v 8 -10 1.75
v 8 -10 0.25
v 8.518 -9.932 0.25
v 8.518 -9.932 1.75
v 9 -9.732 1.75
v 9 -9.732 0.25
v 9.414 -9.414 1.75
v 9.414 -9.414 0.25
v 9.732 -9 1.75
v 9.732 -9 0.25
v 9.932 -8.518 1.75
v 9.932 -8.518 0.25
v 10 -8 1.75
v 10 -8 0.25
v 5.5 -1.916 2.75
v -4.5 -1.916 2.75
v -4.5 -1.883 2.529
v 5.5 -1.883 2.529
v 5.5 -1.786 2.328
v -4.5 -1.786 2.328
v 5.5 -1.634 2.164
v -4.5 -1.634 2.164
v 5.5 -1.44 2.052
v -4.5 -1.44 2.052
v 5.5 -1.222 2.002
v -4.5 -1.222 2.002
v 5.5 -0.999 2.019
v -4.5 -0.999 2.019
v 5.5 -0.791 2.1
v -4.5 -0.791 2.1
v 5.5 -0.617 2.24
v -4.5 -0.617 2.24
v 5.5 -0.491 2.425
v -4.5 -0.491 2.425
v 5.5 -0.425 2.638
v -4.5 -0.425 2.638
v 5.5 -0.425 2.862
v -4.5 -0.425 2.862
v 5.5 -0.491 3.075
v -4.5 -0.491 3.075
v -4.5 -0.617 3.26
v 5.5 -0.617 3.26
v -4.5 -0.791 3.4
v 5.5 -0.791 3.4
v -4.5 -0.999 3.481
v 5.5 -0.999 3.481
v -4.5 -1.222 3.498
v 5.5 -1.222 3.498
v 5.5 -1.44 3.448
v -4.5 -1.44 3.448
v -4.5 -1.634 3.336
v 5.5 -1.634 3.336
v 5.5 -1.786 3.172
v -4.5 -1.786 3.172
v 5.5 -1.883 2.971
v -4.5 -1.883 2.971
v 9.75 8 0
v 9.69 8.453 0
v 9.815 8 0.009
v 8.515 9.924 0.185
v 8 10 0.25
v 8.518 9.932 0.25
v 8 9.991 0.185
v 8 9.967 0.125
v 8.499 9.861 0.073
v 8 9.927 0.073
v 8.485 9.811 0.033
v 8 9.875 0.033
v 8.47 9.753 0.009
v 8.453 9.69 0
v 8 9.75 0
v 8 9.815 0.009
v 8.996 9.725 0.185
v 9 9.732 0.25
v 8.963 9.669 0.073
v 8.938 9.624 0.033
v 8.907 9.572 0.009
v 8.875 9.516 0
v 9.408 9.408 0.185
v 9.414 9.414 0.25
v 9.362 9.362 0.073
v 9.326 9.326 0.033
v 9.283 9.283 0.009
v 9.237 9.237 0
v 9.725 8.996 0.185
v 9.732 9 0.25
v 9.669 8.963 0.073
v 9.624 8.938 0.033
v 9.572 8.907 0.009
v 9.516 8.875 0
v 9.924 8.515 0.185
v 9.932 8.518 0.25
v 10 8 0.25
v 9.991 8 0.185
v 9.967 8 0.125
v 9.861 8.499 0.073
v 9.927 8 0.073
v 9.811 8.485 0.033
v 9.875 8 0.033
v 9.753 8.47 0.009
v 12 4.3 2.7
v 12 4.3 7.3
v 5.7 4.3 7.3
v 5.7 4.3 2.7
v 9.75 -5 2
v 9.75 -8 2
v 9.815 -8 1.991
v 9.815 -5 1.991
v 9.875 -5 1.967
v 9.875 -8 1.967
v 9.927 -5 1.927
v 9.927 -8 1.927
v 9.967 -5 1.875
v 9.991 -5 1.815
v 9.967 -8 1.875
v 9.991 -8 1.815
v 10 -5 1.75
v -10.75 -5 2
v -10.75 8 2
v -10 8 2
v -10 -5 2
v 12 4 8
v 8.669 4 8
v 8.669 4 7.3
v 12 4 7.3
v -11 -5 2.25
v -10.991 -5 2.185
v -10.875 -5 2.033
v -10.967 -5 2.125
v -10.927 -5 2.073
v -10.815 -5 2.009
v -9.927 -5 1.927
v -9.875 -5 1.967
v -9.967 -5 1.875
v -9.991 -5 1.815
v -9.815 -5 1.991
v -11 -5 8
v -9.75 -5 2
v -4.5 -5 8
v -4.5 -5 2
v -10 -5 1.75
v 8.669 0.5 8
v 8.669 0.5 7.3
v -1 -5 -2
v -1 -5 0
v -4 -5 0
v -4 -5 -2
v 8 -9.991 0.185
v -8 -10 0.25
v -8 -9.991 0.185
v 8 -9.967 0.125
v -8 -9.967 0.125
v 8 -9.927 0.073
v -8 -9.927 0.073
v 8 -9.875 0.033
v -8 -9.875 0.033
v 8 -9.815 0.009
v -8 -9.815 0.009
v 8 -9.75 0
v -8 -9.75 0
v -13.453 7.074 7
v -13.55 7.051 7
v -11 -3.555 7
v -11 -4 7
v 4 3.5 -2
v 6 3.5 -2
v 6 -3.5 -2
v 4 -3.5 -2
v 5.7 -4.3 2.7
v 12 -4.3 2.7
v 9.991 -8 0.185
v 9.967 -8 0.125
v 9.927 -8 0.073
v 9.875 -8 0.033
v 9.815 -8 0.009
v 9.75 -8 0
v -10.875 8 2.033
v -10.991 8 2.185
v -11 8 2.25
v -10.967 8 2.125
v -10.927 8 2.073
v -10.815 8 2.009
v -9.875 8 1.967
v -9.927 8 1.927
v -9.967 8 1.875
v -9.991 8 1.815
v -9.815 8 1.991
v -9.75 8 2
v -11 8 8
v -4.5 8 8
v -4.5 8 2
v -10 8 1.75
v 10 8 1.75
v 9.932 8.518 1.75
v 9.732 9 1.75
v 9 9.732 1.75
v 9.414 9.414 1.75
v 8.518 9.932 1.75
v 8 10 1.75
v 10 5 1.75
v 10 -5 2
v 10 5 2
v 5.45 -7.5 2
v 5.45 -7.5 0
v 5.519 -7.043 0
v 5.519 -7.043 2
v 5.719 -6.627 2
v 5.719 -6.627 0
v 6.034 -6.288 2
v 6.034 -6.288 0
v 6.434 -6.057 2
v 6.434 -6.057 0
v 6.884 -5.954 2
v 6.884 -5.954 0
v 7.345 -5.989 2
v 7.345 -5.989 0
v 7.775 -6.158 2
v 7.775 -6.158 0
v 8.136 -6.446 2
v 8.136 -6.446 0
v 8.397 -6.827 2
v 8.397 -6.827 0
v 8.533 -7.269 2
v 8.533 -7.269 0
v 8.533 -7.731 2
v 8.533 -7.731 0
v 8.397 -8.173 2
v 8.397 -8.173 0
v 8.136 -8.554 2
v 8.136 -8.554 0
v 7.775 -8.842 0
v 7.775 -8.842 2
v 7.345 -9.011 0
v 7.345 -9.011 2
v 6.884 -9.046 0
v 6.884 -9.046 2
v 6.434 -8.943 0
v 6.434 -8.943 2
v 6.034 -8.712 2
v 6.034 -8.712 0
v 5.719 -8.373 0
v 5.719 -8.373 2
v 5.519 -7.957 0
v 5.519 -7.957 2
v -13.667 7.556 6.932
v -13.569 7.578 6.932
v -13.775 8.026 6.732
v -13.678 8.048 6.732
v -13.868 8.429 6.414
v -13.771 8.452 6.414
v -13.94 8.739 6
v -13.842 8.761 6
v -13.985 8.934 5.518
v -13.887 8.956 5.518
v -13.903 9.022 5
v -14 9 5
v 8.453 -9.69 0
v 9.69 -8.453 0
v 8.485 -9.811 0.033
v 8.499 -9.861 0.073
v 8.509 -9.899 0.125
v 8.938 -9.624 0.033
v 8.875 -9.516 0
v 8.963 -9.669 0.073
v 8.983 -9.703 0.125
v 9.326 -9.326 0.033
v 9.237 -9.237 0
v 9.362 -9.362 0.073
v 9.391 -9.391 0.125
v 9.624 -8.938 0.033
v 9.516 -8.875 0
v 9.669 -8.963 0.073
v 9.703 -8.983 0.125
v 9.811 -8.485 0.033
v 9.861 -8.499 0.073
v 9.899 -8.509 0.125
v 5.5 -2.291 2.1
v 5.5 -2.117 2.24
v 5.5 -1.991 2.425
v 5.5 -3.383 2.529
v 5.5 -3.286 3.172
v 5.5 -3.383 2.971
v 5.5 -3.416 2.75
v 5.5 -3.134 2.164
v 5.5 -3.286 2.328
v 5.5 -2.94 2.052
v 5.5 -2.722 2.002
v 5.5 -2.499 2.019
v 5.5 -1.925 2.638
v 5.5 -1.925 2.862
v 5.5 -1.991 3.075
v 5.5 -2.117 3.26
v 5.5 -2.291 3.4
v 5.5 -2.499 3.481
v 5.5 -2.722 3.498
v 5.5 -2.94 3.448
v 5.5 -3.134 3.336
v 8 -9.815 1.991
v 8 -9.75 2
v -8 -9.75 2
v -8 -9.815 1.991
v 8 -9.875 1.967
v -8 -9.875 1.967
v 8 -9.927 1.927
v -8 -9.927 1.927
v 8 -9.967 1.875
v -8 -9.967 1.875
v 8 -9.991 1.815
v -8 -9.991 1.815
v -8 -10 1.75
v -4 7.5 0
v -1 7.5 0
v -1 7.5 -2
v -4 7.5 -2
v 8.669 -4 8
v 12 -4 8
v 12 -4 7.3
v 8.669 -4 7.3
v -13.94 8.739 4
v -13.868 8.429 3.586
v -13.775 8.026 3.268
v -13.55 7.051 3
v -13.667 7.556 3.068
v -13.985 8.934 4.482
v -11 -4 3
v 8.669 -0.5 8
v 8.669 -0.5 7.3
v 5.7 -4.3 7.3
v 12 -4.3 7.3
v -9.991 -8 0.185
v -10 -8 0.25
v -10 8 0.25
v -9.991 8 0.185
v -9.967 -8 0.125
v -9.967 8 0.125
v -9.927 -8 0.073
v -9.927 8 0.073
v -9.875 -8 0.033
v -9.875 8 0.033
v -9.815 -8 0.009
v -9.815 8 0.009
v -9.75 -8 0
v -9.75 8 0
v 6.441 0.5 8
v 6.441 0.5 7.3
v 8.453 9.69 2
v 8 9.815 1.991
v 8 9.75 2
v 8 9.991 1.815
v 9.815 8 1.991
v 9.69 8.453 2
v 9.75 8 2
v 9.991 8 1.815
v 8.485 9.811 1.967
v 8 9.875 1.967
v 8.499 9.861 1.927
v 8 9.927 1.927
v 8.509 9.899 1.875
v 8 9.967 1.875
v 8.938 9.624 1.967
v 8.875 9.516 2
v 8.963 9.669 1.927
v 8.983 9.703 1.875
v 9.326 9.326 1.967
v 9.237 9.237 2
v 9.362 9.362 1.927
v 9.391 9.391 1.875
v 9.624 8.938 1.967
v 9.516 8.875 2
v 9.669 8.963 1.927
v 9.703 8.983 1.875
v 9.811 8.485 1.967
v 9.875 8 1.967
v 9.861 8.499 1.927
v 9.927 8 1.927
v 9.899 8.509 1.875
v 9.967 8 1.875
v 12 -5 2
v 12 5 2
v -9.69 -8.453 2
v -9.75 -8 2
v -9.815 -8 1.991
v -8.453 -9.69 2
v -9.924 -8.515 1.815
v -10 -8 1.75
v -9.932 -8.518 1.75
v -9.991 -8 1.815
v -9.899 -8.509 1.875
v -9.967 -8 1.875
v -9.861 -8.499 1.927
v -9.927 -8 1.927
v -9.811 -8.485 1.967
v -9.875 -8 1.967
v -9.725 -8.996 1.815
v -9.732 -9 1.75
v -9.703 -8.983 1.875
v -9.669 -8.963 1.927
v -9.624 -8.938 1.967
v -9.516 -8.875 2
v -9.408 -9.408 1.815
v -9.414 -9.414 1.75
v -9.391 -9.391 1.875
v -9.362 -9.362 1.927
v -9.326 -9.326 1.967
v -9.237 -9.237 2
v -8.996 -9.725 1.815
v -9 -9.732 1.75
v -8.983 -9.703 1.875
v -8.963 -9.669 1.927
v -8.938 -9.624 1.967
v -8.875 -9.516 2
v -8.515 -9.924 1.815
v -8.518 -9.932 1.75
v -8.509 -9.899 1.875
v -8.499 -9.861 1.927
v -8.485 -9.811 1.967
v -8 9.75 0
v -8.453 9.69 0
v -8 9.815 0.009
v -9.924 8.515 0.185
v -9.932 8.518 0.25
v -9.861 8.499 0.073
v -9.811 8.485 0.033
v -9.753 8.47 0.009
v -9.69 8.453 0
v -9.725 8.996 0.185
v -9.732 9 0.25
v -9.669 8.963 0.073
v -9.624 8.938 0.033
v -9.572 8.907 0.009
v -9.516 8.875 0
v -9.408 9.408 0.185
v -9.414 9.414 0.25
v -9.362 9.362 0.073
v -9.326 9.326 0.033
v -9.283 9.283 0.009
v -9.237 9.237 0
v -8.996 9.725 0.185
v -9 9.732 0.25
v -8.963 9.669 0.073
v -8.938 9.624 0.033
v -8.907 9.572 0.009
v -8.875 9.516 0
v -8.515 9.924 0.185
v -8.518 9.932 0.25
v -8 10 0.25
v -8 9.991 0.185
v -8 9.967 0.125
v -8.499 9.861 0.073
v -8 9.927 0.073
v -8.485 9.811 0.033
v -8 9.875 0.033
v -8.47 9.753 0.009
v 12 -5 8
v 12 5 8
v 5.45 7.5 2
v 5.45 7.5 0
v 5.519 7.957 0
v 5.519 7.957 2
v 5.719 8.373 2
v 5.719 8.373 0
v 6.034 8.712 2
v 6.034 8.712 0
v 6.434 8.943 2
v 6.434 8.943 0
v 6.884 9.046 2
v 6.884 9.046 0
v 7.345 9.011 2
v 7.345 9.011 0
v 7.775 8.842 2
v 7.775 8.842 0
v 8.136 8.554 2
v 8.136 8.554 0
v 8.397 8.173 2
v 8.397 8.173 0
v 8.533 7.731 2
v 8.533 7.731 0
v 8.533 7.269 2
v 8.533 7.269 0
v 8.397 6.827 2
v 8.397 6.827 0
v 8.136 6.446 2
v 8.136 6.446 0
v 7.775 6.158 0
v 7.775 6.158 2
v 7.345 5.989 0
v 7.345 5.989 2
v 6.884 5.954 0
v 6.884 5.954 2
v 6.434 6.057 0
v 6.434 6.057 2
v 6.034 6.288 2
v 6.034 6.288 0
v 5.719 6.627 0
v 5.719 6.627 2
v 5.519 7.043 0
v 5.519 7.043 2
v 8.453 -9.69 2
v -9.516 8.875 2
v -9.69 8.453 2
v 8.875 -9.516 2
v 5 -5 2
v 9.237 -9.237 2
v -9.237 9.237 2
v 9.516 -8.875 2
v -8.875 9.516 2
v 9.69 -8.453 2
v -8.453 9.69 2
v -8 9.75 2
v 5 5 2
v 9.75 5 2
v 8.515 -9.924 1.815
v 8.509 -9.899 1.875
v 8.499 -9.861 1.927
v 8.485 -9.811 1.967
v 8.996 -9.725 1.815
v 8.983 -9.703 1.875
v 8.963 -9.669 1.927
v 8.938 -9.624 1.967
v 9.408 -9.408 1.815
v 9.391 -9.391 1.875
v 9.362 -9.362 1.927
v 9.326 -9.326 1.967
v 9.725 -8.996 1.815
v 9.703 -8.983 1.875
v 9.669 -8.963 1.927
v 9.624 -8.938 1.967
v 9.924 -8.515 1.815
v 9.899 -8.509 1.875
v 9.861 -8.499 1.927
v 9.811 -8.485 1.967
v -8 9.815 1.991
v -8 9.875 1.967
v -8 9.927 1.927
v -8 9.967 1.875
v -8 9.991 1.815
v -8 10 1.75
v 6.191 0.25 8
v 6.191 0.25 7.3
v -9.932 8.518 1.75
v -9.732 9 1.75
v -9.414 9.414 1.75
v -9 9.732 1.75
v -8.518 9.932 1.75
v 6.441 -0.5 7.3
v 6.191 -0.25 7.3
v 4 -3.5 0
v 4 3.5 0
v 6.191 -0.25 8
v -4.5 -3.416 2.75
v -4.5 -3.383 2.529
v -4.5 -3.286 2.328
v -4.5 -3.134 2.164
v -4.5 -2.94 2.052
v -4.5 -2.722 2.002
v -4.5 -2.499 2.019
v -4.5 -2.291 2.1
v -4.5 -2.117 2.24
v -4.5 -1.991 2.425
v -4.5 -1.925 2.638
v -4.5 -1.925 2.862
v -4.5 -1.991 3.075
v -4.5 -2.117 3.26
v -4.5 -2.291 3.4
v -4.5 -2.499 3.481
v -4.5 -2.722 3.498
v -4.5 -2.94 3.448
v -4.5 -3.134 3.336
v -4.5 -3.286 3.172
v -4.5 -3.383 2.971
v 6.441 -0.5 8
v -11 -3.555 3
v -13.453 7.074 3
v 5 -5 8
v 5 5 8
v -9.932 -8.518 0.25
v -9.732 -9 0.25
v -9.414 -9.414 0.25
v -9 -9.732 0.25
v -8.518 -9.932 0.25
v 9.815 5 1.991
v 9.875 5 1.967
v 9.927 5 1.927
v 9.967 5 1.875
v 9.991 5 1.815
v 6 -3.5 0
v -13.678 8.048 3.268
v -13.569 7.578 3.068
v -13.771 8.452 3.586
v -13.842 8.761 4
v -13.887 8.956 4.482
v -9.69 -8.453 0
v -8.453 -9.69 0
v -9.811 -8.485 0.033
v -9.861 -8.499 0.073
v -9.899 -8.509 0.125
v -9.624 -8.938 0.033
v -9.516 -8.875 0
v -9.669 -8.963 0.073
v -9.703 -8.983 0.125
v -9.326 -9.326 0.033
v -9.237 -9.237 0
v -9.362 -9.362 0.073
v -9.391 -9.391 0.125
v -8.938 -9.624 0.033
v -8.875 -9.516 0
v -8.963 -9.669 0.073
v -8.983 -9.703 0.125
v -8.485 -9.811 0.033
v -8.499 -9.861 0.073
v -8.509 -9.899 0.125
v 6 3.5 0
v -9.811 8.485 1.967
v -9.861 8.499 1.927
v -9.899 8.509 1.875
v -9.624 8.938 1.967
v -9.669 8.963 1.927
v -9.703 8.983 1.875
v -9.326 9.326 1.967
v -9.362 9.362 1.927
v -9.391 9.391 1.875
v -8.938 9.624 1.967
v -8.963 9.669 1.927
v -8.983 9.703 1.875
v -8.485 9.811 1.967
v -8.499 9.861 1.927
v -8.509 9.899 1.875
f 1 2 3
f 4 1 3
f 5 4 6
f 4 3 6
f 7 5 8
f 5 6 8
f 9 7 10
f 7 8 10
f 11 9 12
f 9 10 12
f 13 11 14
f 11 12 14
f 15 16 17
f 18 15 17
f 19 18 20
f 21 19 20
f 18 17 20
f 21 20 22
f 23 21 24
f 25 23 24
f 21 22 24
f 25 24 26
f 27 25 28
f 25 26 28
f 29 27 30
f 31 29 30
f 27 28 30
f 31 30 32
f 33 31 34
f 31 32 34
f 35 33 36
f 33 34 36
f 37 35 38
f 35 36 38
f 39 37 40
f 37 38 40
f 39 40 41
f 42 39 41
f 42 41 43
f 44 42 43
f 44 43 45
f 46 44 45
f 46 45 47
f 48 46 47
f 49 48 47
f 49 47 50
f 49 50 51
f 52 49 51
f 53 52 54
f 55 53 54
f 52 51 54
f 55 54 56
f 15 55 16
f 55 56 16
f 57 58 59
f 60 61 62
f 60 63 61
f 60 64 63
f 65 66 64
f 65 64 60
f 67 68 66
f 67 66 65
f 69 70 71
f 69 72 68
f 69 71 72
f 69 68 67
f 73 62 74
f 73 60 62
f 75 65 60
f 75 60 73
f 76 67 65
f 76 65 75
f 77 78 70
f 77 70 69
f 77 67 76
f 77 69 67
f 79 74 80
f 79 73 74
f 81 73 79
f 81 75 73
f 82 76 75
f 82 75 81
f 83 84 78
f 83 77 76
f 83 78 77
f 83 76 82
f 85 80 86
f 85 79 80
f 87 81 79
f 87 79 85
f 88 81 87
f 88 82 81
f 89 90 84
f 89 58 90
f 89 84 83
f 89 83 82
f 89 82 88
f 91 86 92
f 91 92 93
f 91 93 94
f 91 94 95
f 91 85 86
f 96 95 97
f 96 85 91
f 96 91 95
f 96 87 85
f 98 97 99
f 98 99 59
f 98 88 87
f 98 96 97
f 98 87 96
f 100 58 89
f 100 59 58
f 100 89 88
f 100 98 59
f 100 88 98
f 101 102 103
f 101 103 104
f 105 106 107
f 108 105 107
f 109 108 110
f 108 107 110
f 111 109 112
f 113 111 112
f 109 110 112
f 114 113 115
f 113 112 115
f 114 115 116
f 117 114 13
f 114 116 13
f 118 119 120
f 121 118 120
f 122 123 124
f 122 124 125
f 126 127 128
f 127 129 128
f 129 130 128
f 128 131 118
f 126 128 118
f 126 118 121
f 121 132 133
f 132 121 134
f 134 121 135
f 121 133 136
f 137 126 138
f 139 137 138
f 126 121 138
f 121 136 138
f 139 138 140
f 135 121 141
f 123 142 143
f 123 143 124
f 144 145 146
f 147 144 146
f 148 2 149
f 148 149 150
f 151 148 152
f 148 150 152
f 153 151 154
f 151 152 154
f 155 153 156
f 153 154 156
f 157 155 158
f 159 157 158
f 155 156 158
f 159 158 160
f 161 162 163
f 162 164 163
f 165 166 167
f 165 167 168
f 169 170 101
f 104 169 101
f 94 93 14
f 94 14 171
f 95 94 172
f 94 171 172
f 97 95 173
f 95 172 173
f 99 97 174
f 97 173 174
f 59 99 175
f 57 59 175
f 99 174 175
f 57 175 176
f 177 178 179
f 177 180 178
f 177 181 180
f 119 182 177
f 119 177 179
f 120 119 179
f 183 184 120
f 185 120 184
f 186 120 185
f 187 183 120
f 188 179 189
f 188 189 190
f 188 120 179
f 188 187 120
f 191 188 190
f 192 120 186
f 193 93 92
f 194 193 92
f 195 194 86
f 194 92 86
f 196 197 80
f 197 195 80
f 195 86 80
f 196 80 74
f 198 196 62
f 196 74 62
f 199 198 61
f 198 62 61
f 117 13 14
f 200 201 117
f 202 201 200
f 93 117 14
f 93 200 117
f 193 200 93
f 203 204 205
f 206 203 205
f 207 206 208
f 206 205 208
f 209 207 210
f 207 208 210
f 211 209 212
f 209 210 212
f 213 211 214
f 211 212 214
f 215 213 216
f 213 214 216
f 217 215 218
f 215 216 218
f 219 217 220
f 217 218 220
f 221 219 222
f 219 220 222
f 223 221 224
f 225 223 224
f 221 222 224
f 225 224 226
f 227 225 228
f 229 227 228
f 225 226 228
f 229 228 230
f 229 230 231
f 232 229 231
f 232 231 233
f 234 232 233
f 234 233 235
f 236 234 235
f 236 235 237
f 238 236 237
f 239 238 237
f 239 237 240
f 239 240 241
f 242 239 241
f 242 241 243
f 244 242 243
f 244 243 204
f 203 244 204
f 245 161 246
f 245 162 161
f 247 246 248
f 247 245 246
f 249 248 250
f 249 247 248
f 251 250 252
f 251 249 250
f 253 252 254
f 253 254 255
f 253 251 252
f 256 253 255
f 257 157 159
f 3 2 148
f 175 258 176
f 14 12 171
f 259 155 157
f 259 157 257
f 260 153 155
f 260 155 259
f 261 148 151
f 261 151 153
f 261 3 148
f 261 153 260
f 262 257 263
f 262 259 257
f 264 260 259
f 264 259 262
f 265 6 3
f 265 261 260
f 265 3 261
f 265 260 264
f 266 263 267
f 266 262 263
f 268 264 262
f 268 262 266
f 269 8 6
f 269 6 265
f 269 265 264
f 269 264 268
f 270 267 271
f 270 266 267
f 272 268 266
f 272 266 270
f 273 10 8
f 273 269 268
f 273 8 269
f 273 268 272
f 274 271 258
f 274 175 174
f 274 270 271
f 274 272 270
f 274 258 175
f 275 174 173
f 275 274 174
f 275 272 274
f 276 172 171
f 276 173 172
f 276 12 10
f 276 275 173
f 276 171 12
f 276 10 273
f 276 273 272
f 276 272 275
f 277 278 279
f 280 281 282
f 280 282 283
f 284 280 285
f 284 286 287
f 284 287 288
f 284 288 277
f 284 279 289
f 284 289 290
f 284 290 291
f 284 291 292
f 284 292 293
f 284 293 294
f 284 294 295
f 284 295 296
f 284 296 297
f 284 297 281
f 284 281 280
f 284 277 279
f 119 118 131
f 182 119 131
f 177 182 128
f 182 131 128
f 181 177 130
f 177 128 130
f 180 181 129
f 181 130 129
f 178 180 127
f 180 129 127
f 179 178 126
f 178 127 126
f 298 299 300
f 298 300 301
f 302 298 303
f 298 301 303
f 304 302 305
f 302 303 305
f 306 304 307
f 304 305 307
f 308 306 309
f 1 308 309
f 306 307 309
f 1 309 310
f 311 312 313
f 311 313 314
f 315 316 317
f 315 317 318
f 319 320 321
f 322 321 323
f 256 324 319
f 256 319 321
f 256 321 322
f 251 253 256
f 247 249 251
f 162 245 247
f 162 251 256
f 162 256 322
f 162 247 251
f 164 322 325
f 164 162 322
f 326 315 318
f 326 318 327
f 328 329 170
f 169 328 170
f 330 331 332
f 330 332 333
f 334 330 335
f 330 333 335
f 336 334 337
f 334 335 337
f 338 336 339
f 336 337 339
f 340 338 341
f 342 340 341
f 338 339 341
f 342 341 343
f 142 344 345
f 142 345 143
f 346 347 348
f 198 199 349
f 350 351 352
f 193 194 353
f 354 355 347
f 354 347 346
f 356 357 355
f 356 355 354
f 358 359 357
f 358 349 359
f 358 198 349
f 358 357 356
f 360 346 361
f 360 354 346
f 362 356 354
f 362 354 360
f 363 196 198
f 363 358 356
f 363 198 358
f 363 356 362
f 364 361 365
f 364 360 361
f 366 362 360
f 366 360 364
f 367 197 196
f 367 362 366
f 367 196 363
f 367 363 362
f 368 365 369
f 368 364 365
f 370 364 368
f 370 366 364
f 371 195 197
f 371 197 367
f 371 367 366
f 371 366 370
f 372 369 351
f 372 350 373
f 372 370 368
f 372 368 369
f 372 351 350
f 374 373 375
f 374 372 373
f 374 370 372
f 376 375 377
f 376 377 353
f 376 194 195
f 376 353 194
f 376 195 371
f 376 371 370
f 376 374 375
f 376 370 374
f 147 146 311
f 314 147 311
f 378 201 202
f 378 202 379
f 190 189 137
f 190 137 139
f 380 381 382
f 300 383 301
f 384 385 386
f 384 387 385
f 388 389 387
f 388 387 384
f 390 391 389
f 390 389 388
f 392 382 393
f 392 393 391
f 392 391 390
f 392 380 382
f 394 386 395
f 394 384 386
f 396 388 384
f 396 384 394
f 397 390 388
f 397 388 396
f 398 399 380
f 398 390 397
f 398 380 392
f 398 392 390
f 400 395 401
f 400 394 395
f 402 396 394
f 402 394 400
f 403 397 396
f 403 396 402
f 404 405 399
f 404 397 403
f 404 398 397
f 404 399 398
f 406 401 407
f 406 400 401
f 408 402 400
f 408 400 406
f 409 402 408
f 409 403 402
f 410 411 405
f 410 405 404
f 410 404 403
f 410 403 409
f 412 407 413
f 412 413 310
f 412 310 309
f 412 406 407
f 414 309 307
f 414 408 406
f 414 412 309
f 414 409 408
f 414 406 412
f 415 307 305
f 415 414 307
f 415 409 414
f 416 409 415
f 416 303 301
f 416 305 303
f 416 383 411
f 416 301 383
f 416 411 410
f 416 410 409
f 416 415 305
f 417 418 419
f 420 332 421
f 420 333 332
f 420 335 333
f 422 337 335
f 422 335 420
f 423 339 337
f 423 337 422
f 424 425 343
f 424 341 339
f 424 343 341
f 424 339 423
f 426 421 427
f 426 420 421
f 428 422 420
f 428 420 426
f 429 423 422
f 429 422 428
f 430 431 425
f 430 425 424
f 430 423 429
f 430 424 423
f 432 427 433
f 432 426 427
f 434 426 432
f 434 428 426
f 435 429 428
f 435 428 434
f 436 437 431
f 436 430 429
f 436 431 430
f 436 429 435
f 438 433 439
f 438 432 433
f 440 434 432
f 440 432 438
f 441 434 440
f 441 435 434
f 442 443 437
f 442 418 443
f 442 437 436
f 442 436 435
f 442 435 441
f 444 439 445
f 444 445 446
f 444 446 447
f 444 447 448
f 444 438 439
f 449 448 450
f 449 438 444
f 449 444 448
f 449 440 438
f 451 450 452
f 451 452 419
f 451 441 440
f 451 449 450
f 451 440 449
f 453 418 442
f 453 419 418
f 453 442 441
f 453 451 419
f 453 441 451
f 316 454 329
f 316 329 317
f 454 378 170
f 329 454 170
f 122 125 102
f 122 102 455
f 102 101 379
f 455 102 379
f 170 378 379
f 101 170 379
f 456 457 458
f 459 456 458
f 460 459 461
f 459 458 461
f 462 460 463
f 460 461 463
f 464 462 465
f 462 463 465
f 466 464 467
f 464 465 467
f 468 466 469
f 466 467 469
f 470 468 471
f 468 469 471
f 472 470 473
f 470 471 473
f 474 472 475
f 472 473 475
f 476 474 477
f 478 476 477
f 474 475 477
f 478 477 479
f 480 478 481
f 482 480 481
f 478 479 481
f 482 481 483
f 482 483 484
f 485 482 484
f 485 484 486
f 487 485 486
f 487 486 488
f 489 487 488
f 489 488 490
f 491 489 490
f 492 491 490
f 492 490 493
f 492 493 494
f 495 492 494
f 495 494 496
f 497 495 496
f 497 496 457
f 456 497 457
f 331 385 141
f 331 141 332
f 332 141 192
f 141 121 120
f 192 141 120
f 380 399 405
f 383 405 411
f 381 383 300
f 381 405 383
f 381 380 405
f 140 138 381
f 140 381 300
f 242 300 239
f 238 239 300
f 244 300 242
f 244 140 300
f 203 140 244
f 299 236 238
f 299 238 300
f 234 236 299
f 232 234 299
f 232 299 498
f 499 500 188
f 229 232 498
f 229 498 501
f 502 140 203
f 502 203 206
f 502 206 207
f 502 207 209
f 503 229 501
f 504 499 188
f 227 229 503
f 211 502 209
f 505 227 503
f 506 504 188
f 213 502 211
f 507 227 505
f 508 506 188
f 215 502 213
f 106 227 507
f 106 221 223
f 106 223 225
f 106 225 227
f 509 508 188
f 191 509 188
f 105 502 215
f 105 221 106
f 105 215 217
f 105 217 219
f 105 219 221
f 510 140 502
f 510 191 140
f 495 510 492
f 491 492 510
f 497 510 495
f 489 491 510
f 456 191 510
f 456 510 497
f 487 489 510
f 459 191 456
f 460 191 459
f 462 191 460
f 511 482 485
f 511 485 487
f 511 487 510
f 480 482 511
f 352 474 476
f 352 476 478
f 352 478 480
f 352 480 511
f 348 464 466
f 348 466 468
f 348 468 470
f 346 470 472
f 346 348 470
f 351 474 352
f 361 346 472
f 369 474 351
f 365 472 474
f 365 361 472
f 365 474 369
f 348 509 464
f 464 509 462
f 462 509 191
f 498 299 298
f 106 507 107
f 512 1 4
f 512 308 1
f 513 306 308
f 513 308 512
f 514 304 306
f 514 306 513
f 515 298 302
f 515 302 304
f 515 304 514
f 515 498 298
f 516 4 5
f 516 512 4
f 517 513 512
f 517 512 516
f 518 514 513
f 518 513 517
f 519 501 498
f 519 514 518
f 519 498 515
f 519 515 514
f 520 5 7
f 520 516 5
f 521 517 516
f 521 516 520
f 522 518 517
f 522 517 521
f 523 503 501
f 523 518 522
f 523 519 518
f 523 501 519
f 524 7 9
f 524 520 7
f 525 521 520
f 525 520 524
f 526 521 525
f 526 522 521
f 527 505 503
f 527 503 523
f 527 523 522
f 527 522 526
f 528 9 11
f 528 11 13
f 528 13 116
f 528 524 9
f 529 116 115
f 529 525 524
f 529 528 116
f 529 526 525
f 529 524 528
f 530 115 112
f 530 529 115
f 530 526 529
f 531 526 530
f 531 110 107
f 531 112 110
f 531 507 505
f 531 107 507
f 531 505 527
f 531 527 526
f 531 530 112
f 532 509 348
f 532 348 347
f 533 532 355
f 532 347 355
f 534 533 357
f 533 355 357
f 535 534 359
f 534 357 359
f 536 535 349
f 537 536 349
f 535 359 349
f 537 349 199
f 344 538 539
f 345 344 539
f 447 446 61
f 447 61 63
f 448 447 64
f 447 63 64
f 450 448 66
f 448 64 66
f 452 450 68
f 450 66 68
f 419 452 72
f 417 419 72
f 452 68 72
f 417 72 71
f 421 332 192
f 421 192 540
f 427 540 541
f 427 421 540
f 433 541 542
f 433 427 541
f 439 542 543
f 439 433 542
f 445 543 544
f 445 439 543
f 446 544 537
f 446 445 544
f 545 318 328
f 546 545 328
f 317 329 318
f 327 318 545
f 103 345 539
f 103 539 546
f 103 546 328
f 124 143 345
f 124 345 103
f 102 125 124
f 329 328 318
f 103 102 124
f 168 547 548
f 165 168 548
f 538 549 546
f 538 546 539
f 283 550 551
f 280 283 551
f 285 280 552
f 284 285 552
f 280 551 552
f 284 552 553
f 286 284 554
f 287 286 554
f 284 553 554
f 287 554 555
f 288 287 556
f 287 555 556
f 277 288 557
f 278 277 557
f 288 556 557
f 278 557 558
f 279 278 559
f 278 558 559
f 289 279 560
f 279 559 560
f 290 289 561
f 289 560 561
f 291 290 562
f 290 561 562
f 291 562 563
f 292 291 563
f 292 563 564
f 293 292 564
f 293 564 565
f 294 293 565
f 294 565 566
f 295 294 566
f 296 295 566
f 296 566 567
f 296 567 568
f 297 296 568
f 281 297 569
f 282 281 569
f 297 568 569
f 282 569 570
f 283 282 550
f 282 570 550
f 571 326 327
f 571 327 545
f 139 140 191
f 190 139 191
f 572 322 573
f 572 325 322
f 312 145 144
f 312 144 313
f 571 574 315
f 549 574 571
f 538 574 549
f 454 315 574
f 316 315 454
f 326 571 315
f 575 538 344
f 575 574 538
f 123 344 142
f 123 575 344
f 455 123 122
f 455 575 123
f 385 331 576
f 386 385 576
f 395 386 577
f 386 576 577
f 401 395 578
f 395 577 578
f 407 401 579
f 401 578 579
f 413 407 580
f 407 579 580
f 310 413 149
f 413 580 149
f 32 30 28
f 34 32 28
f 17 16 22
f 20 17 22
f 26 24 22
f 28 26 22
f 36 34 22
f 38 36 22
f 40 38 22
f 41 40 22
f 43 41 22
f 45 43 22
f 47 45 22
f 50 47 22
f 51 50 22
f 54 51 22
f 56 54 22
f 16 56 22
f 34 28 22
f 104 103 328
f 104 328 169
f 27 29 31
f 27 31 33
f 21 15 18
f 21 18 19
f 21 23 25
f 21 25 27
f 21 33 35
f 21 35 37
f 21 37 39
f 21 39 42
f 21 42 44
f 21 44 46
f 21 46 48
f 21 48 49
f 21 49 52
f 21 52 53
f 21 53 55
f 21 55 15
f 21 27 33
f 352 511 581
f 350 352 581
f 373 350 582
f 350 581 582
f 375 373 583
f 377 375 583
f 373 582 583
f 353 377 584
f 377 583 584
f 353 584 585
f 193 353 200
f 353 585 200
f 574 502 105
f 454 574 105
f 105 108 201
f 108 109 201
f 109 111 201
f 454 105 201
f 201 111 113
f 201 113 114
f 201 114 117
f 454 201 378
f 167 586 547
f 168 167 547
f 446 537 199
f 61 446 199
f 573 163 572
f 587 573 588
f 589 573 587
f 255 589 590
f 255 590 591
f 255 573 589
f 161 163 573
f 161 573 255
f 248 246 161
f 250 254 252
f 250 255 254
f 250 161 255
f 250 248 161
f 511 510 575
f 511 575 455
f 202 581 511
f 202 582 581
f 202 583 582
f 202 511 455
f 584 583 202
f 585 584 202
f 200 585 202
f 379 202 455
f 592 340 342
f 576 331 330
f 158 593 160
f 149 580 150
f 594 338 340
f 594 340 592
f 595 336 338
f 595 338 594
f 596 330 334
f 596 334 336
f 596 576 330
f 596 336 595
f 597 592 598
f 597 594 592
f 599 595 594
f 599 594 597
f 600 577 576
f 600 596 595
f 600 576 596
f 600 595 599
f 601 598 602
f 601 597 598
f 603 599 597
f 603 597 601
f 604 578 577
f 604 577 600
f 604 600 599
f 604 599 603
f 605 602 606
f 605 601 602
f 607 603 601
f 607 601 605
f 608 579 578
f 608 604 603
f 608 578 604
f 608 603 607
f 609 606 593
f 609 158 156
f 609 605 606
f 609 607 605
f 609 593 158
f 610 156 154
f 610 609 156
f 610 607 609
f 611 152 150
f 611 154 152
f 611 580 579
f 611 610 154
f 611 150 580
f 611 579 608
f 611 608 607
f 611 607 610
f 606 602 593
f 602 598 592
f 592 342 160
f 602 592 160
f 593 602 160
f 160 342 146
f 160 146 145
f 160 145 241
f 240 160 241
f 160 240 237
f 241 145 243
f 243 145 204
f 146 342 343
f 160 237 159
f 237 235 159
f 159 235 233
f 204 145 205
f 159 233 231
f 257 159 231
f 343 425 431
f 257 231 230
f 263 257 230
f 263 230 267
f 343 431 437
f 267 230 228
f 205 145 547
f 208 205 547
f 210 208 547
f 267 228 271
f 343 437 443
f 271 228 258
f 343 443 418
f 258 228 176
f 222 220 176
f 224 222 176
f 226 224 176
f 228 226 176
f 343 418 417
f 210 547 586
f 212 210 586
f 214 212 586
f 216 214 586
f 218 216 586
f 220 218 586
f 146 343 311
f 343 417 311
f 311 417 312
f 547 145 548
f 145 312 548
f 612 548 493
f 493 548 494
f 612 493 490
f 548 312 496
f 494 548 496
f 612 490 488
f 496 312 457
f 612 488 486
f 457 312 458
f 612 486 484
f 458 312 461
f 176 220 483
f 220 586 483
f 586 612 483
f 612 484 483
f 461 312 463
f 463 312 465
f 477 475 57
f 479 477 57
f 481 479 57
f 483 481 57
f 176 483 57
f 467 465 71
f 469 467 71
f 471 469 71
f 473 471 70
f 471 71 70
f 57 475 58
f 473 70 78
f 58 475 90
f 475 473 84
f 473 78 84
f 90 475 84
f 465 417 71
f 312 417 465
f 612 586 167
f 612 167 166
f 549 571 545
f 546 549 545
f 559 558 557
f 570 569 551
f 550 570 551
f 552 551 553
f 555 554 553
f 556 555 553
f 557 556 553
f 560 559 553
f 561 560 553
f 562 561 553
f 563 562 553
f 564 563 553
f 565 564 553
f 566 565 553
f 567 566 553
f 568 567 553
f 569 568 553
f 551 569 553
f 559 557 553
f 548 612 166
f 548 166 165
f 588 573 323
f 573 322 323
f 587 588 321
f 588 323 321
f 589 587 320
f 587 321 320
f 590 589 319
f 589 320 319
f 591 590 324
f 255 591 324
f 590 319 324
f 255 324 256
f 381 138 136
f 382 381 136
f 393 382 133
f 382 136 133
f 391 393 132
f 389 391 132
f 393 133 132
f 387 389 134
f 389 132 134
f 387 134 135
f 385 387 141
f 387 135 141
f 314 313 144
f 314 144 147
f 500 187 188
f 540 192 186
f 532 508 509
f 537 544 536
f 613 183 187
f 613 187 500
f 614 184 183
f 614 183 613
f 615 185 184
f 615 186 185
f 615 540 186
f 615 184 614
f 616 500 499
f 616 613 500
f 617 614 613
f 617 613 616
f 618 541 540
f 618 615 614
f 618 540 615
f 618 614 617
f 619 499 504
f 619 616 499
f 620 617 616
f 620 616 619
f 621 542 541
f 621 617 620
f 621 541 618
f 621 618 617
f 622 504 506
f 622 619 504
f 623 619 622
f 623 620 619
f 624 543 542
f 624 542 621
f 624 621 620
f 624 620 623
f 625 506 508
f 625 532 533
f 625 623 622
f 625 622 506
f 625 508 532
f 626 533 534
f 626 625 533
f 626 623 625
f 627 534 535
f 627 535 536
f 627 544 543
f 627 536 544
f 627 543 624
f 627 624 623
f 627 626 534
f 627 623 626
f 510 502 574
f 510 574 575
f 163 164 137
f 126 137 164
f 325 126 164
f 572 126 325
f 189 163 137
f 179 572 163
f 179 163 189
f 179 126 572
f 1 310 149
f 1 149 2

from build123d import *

# Parameters (mm, degrees)
CROQUIS1_W                          = 20
CROQUIS1_H                          = 20
SALIENTE_EXTRUIR1_DEPTH             = 2
CROQUIS2_W                          = 7
CROQUIS2_H                          = 10
SALIENTE_EXTRUIR2_DEPTH             = 6
CROQUIS3_W                          = 6.5
CROQUIS3_H                          = 13
SALIENTE_EXTRUIR3_DEPTH             = 6
SALIENTE_EXTRUIR4_DEPTH             = 4
CROQUIS6_W                          = 3
CROQUIS6_H                          = 12.5
SALIENTE_EXTRUIR6_DEPTH             = 2
CROQUIS7_W                          = 2
CROQUIS7_H                          = 7
SALIENTE_EXTRUIR7_DEPTH             = 2
CROQUIS8_W                          = 4.6
CROQUIS8_H                          = 8.6
CORTAR_EXTRUIR1_DEPTH               = 6.3
NGULO_DE_SALIDA1_ANGLE              = -77.005383208
NGULO_DE_SALIDA2_ANGLE              = 77.005383208
DI_METRO_DE_TALADRO_3_1_3_1_1_D     = 3.1
DI_METRO_DE_TALADRO_3_1_3_1_1_DEPTH = 4
REDONDEO2_R                         = 2
REDONDEO3_R                         = 2
REDONDEO4_R                         = 0.25
CORTAR_EXTRUIR2_DEPTH               = 1
CHAFL_N1_SIZE                       = 0.25
CROQUIS19_R                         = 0.75
SALIENTE_EXTRUIR9_DEPTH             = 10
SALIENTE_EXTRUIR9_2_DEPTH           = 10


# Some blends are built 0.0001 mm under size
with BuildPart() as part:
    # Croquis1 → Saliente-Extruir1 (new body)
    with BuildSketch(Plane.XY.offset(2)):
        Rectangle(CROQUIS1_W, CROQUIS1_H)
    extrude(amount=-SALIENTE_EXTRUIR1_DEPTH)

    # Croquis2 → Saliente-Extruir2 (add)
    with BuildSketch(Plane.XY.offset(2)):
        with Locations((8.5, 0)):
            Rectangle(CROQUIS2_W, CROQUIS2_H)
    extrude(amount=SALIENTE_EXTRUIR2_DEPTH)

    # Croquis3 → Saliente-Extruir3 (add)
    with BuildSketch(Plane.XY.offset(2)):
        with Locations((-7.75, 1.5)):
            Rectangle(CROQUIS3_W, CROQUIS3_H)
    extrude(amount=SALIENTE_EXTRUIR3_DEPTH)

    # Croquis4 → Saliente-Extruir4 (add)
    with BuildSketch(Plane.XY.offset(7)):
        Polygon((-68.40620408, -3.555277865), (-70.333333333, -4), (-11, -4), (-11, -3.555277865), align=None)
    extrude(amount=-SALIENTE_EXTRUIR4_DEPTH)

    # Croquis6 → Saliente-Extruir6 (add)
    with BuildSketch(Plane(origin=(0, 0, 0), x_dir=(-1, 0, 0), z_dir=(0, 0, -1))):
        with Locations((2.5, 1.25)):
            Rectangle(CROQUIS6_W, CROQUIS6_H)
    extrude(amount=SALIENTE_EXTRUIR6_DEPTH)

    # Croquis7 → Saliente-Extruir7 (add)
    with BuildSketch(Plane(origin=(0, 0, 0), x_dir=(-1, 0, 0), z_dir=(0, 0, -1))):
        with Locations((-5, 0)):
            Rectangle(CROQUIS7_W, CROQUIS7_H)
    extrude(amount=SALIENTE_EXTRUIR7_DEPTH)

    # Croquis8 → Cortar-Extruir1 (cut)
    with BuildSketch(Plane(origin=(12, 0, 0), x_dir=(0, 0, -1), z_dir=(1, 0, 0))):
        with Locations((-5, 0)):
            Rectangle(CROQUIS8_W, CROQUIS8_H)
    extrude(amount=-CORTAR_EXTRUIR1_DEPTH, mode=Mode.SUBTRACT)

    # Ángulo de salida1
    ngulo_de_salida1_faces = [part.faces().sort_by_distance(p)[0] for p in [
        (-39.70310204, -3.555277865, 5),
    ]]
    draft(ngulo_de_salida1_faces, Plane(origin=(-11, -5, 8), x_dir=(0, 0, -1), z_dir=(-1, 0, 0)), NGULO_DE_SALIDA1_ANGLE)

    # Ángulo de salida2
    ngulo_de_salida2_faces = [part.faces().sort_by_distance(p)[0] for p in [
        (-40.666666667, -4, 5),
    ]]
    draft(ngulo_de_salida2_faces, Plane(origin=(-11, -5, 8), x_dir=(0, 0, -1), z_dir=(-1, 0, 0)), NGULO_DE_SALIDA2_ANGLE)

    # Diámetro de taladro Ø3.1 (3.1)1
    with Locations(Plane.XY.offset(2)):
        with Locations((7, -7.5), (7, 7.5)):
            Hole(DI_METRO_DE_TALADRO_3_1_3_1_1_D / 2, depth=DI_METRO_DE_TALADRO_3_1_3_1_1_DEPTH)

    # Redondeo2
    redondeo2_edges = [part.edges().sort_by_distance(p)[0] for p in [
        (10, 10, 1),
        (10, -10, 1),
        (-10, -10, 1),
        (-10, 10, 1),
    ]]
    fillet(redondeo2_edges, radius=REDONDEO2_R)

    # Redondeo3
    redondeo3_edges = [part.edges().sort_by_distance(p)[0] for p in [
        (-13.95128044, 9.011242975, 7),
        (-13.95128044, 9.011242975, 3),
    ]]
    fillet(redondeo3_edges, radius=REDONDEO3_R - 0.0001)  # a hair under: the kernel refuses the full size

    # Redondeo4
    # the kernel refuses this fillet: 0.25 mm, written as the material it takes off along each edge
    with BuildSketch(Plane(origin=(8, 10, 2), x_dir=(0, -1, 0), z_dir=(-1, 0, 0)), Plane(origin=(8, 10, 0), x_dir=(0, 0, 1), z_dir=(-1, 0, 0)), Plane(origin=(-8, -10, 2), x_dir=(0, 1, 0), z_dir=(1, 0, 0)), Plane(origin=(-10, 8, 0), x_dir=(0, 0, 1), z_dir=(0, -1, 0)), Plane(origin=(10, -8, 0), x_dir=(0, 0, 1), z_dir=(0, 1, 0)), Plane(origin=(-8, -10, 0), x_dir=(0, 0, 1), z_dir=(1, 0, 0))) as redondeo4_piece_1:
        with BuildLine():
            CenterArc((REDONDEO4_R, -REDONDEO4_R), REDONDEO4_R, 90, 90)
            Line((0, -REDONDEO4_R), (0, 0))
            Line((0, 0), (REDONDEO4_R, 0))
        make_face()
    extrude(amount=16, mode=Mode.SUBTRACT)
    with BuildSketch(Plane(origin=(10, -8, 2), x_dir=(-1, 0, 0), z_dir=(0, 1, 0)), Plane(origin=(10, 5, 2), x_dir=(-1, 0, 0), z_dir=(0, 1, 0)), Plane(origin=(-10, -5, 2), x_dir=(1, 0, 0), z_dir=(0, -1, 0))) as redondeo4_piece_2:
        with BuildLine():
            CenterArc((REDONDEO4_R, -REDONDEO4_R), REDONDEO4_R, 90, 90)
            Line((0, -REDONDEO4_R), (0, 0))
            Line((0, 0), (REDONDEO4_R, 0))
        make_face()
    extrude(amount=3, mode=Mode.SUBTRACT)
    with BuildSketch(Plane(origin=(-8, -8, 2), x_dir=(-1, 0, 0), z_dir=(0, 1, 0))) as redondeo4_piece_3:
        with BuildLine():
            CenterArc((2 - REDONDEO4_R, -REDONDEO4_R), REDONDEO4_R, 0, 90)
            Line((2, -REDONDEO4_R), (2, 0))
            Line((2, 0), (2 - REDONDEO4_R, 0))
        make_face()
    revolve(axis=Axis((-8, -8, 2), (0, 0, 1)), revolution_arc=90, mode=Mode.SUBTRACT)
    with BuildSketch(Plane(origin=(8, -8, 2), x_dir=(0, -1, 0), z_dir=(-1, 0, 0))) as redondeo4_piece_4:
        with BuildLine():
            CenterArc((2 - REDONDEO4_R, -REDONDEO4_R), REDONDEO4_R, 0, 90)
            Line((2, -REDONDEO4_R), (2, 0))
            Line((2, 0), (2 - REDONDEO4_R, 0))
        make_face()
    revolve(axis=Axis((8, -8, 2), (0, 0, 1)), revolution_arc=90, mode=Mode.SUBTRACT)
    with BuildSketch(Plane(origin=(8, 8, 2), x_dir=(0, 1, 0), z_dir=(-1, 0, 0))) as redondeo4_piece_5:
        with BuildLine():
            CenterArc((2 - REDONDEO4_R, REDONDEO4_R), REDONDEO4_R, 270, 90)
            Line((2, REDONDEO4_R), (2, 0))
            Line((2, 0), (2 - REDONDEO4_R, 0))
        make_face()
    revolve(axis=Axis((8, 8, 2), (0, 0, -1)), revolution_arc=90, mode=Mode.SUBTRACT)
    with BuildSketch(Plane(origin=(-8, 8, 2), x_dir=(-1, 0, 0), z_dir=(0, -1, 0))) as redondeo4_piece_6:
        with BuildLine():
            CenterArc((2 - REDONDEO4_R, REDONDEO4_R), REDONDEO4_R, 270, 90)
            Line((2, REDONDEO4_R), (2, 0))
            Line((2, 0), (2 - REDONDEO4_R, 0))
        make_face()
    revolve(axis=Axis((-8, 8, 2), (0, 0, -1)), revolution_arc=90, mode=Mode.SUBTRACT)
    with BuildSketch(Plane(origin=(-8, -8, 0), x_dir=(-1, 0, 0), z_dir=(0, 1, 0))) as redondeo4_piece_7:
        with BuildLine():
            CenterArc((2 - REDONDEO4_R, REDONDEO4_R), REDONDEO4_R, 270, 90)
            Line((2 - REDONDEO4_R, 0), (2, 0))
            Line((2, 0), (2, REDONDEO4_R))
        make_face()
    revolve(axis=Axis((-8, -8, 0), (0, 0, 1)), revolution_arc=90, mode=Mode.SUBTRACT)
    with BuildSketch(Plane(origin=(8, -8, 0), x_dir=(0, -1, 0), z_dir=(-1, 0, 0))) as redondeo4_piece_8:
        with BuildLine():
            CenterArc((2 - REDONDEO4_R, REDONDEO4_R), REDONDEO4_R, 270, 90)
            Line((2 - REDONDEO4_R, 0), (2, 0))
            Line((2, 0), (2, REDONDEO4_R))
        make_face()
    revolve(axis=Axis((8, -8, 0), (0, 0, 1)), revolution_arc=90, mode=Mode.SUBTRACT)
    with BuildSketch(Plane(origin=(8, 8, 0), x_dir=(0, 1, 0), z_dir=(-1, 0, 0))) as redondeo4_piece_9:
        with BuildLine():
            CenterArc((2 - REDONDEO4_R, -REDONDEO4_R), REDONDEO4_R, 0, 90)
            Line((2 - REDONDEO4_R, 0), (2, 0))
            Line((2, 0), (2, -REDONDEO4_R))
        make_face()
    revolve(axis=Axis((8, 8, 0), (0, 0, -1)), revolution_arc=90, mode=Mode.SUBTRACT)
    with BuildSketch(Plane(origin=(-8, 8, 0), x_dir=(-1, 0, 0), z_dir=(0, -1, 0))) as redondeo4_piece_10:
        with BuildLine():
            CenterArc((2 - REDONDEO4_R, -REDONDEO4_R), REDONDEO4_R, 0, 90)
            Line((2 - REDONDEO4_R, 0), (2, 0))
            Line((2, 0), (2, -REDONDEO4_R))
        make_face()
    revolve(axis=Axis((-8, 8, 0), (0, 0, -1)), revolution_arc=90, mode=Mode.SUBTRACT)
    with BuildSketch(Plane(origin=(-11, -5.625, 2), x_dir=(0, 0, 1), z_dir=(0, 1, 0))) as redondeo4_piece_11:
        with BuildLine():
            CenterArc((REDONDEO4_R, REDONDEO4_R), REDONDEO4_R, 180, 90)
            Line((0, REDONDEO4_R), (0, 0))
            Line((0, 0), (REDONDEO4_R, 0))
        make_face()
    extrude(amount=14.25, mode=Mode.SUBTRACT)

    # Croquis16 → Cortar-Extruir2 (cut)
    with BuildSketch(Plane.XY.offset(8)):
        Polygon((12, -4), (8.669246852, -4), (8.669246852, -0.5), (6.190591253, -0.5), (6.190591253, 0.5), (8.669246852, 0.5), (8.669246852, 4), (12, 4), align=None)
    extrude(amount=-CORTAR_EXTRUIR2_DEPTH, mode=Mode.SUBTRACT)

    # Chaflán1
    chafl_n1_edges = [part.edges().sort_by_distance(p)[0] for p in [
        (6.190591253, -0.5, 7.65),
        (6.190591253, 0.5, 7.65),
    ]]
    chamfer(chafl_n1_edges, length=CHAFL_N1_SIZE)


with BuildPart() as body_2:
    # Croquis19 → Saliente-Extruir9 (new body)
    with BuildSketch(Plane(origin=(-4.5, 0, 0), x_dir=(0, 0, -1), z_dir=(1, 0, 0))):
        with Locations(Location((-2.75, -1.166325022, 0), (0, 0, 270))):
            Circle(CROQUIS19_R)
    extrude(amount=SALIENTE_EXTRUIR9_DEPTH)


with BuildPart() as body_3:
    # Croquis19 → Saliente-Extruir9 2 (new body)
    with BuildSketch(Plane(origin=(-4.5, 0, 0), x_dir=(0, 0, -1), z_dir=(1, 0, 0))):
        with Locations(Location((-2.75, -2.666325022, 0), (0, 0, 270))):
            Circle(CROQUIS19_R)
    extrude(amount=SALIENTE_EXTRUIR9_2_DEPTH)


solid = Compound([part.part, body_2.part, body_3.part])
